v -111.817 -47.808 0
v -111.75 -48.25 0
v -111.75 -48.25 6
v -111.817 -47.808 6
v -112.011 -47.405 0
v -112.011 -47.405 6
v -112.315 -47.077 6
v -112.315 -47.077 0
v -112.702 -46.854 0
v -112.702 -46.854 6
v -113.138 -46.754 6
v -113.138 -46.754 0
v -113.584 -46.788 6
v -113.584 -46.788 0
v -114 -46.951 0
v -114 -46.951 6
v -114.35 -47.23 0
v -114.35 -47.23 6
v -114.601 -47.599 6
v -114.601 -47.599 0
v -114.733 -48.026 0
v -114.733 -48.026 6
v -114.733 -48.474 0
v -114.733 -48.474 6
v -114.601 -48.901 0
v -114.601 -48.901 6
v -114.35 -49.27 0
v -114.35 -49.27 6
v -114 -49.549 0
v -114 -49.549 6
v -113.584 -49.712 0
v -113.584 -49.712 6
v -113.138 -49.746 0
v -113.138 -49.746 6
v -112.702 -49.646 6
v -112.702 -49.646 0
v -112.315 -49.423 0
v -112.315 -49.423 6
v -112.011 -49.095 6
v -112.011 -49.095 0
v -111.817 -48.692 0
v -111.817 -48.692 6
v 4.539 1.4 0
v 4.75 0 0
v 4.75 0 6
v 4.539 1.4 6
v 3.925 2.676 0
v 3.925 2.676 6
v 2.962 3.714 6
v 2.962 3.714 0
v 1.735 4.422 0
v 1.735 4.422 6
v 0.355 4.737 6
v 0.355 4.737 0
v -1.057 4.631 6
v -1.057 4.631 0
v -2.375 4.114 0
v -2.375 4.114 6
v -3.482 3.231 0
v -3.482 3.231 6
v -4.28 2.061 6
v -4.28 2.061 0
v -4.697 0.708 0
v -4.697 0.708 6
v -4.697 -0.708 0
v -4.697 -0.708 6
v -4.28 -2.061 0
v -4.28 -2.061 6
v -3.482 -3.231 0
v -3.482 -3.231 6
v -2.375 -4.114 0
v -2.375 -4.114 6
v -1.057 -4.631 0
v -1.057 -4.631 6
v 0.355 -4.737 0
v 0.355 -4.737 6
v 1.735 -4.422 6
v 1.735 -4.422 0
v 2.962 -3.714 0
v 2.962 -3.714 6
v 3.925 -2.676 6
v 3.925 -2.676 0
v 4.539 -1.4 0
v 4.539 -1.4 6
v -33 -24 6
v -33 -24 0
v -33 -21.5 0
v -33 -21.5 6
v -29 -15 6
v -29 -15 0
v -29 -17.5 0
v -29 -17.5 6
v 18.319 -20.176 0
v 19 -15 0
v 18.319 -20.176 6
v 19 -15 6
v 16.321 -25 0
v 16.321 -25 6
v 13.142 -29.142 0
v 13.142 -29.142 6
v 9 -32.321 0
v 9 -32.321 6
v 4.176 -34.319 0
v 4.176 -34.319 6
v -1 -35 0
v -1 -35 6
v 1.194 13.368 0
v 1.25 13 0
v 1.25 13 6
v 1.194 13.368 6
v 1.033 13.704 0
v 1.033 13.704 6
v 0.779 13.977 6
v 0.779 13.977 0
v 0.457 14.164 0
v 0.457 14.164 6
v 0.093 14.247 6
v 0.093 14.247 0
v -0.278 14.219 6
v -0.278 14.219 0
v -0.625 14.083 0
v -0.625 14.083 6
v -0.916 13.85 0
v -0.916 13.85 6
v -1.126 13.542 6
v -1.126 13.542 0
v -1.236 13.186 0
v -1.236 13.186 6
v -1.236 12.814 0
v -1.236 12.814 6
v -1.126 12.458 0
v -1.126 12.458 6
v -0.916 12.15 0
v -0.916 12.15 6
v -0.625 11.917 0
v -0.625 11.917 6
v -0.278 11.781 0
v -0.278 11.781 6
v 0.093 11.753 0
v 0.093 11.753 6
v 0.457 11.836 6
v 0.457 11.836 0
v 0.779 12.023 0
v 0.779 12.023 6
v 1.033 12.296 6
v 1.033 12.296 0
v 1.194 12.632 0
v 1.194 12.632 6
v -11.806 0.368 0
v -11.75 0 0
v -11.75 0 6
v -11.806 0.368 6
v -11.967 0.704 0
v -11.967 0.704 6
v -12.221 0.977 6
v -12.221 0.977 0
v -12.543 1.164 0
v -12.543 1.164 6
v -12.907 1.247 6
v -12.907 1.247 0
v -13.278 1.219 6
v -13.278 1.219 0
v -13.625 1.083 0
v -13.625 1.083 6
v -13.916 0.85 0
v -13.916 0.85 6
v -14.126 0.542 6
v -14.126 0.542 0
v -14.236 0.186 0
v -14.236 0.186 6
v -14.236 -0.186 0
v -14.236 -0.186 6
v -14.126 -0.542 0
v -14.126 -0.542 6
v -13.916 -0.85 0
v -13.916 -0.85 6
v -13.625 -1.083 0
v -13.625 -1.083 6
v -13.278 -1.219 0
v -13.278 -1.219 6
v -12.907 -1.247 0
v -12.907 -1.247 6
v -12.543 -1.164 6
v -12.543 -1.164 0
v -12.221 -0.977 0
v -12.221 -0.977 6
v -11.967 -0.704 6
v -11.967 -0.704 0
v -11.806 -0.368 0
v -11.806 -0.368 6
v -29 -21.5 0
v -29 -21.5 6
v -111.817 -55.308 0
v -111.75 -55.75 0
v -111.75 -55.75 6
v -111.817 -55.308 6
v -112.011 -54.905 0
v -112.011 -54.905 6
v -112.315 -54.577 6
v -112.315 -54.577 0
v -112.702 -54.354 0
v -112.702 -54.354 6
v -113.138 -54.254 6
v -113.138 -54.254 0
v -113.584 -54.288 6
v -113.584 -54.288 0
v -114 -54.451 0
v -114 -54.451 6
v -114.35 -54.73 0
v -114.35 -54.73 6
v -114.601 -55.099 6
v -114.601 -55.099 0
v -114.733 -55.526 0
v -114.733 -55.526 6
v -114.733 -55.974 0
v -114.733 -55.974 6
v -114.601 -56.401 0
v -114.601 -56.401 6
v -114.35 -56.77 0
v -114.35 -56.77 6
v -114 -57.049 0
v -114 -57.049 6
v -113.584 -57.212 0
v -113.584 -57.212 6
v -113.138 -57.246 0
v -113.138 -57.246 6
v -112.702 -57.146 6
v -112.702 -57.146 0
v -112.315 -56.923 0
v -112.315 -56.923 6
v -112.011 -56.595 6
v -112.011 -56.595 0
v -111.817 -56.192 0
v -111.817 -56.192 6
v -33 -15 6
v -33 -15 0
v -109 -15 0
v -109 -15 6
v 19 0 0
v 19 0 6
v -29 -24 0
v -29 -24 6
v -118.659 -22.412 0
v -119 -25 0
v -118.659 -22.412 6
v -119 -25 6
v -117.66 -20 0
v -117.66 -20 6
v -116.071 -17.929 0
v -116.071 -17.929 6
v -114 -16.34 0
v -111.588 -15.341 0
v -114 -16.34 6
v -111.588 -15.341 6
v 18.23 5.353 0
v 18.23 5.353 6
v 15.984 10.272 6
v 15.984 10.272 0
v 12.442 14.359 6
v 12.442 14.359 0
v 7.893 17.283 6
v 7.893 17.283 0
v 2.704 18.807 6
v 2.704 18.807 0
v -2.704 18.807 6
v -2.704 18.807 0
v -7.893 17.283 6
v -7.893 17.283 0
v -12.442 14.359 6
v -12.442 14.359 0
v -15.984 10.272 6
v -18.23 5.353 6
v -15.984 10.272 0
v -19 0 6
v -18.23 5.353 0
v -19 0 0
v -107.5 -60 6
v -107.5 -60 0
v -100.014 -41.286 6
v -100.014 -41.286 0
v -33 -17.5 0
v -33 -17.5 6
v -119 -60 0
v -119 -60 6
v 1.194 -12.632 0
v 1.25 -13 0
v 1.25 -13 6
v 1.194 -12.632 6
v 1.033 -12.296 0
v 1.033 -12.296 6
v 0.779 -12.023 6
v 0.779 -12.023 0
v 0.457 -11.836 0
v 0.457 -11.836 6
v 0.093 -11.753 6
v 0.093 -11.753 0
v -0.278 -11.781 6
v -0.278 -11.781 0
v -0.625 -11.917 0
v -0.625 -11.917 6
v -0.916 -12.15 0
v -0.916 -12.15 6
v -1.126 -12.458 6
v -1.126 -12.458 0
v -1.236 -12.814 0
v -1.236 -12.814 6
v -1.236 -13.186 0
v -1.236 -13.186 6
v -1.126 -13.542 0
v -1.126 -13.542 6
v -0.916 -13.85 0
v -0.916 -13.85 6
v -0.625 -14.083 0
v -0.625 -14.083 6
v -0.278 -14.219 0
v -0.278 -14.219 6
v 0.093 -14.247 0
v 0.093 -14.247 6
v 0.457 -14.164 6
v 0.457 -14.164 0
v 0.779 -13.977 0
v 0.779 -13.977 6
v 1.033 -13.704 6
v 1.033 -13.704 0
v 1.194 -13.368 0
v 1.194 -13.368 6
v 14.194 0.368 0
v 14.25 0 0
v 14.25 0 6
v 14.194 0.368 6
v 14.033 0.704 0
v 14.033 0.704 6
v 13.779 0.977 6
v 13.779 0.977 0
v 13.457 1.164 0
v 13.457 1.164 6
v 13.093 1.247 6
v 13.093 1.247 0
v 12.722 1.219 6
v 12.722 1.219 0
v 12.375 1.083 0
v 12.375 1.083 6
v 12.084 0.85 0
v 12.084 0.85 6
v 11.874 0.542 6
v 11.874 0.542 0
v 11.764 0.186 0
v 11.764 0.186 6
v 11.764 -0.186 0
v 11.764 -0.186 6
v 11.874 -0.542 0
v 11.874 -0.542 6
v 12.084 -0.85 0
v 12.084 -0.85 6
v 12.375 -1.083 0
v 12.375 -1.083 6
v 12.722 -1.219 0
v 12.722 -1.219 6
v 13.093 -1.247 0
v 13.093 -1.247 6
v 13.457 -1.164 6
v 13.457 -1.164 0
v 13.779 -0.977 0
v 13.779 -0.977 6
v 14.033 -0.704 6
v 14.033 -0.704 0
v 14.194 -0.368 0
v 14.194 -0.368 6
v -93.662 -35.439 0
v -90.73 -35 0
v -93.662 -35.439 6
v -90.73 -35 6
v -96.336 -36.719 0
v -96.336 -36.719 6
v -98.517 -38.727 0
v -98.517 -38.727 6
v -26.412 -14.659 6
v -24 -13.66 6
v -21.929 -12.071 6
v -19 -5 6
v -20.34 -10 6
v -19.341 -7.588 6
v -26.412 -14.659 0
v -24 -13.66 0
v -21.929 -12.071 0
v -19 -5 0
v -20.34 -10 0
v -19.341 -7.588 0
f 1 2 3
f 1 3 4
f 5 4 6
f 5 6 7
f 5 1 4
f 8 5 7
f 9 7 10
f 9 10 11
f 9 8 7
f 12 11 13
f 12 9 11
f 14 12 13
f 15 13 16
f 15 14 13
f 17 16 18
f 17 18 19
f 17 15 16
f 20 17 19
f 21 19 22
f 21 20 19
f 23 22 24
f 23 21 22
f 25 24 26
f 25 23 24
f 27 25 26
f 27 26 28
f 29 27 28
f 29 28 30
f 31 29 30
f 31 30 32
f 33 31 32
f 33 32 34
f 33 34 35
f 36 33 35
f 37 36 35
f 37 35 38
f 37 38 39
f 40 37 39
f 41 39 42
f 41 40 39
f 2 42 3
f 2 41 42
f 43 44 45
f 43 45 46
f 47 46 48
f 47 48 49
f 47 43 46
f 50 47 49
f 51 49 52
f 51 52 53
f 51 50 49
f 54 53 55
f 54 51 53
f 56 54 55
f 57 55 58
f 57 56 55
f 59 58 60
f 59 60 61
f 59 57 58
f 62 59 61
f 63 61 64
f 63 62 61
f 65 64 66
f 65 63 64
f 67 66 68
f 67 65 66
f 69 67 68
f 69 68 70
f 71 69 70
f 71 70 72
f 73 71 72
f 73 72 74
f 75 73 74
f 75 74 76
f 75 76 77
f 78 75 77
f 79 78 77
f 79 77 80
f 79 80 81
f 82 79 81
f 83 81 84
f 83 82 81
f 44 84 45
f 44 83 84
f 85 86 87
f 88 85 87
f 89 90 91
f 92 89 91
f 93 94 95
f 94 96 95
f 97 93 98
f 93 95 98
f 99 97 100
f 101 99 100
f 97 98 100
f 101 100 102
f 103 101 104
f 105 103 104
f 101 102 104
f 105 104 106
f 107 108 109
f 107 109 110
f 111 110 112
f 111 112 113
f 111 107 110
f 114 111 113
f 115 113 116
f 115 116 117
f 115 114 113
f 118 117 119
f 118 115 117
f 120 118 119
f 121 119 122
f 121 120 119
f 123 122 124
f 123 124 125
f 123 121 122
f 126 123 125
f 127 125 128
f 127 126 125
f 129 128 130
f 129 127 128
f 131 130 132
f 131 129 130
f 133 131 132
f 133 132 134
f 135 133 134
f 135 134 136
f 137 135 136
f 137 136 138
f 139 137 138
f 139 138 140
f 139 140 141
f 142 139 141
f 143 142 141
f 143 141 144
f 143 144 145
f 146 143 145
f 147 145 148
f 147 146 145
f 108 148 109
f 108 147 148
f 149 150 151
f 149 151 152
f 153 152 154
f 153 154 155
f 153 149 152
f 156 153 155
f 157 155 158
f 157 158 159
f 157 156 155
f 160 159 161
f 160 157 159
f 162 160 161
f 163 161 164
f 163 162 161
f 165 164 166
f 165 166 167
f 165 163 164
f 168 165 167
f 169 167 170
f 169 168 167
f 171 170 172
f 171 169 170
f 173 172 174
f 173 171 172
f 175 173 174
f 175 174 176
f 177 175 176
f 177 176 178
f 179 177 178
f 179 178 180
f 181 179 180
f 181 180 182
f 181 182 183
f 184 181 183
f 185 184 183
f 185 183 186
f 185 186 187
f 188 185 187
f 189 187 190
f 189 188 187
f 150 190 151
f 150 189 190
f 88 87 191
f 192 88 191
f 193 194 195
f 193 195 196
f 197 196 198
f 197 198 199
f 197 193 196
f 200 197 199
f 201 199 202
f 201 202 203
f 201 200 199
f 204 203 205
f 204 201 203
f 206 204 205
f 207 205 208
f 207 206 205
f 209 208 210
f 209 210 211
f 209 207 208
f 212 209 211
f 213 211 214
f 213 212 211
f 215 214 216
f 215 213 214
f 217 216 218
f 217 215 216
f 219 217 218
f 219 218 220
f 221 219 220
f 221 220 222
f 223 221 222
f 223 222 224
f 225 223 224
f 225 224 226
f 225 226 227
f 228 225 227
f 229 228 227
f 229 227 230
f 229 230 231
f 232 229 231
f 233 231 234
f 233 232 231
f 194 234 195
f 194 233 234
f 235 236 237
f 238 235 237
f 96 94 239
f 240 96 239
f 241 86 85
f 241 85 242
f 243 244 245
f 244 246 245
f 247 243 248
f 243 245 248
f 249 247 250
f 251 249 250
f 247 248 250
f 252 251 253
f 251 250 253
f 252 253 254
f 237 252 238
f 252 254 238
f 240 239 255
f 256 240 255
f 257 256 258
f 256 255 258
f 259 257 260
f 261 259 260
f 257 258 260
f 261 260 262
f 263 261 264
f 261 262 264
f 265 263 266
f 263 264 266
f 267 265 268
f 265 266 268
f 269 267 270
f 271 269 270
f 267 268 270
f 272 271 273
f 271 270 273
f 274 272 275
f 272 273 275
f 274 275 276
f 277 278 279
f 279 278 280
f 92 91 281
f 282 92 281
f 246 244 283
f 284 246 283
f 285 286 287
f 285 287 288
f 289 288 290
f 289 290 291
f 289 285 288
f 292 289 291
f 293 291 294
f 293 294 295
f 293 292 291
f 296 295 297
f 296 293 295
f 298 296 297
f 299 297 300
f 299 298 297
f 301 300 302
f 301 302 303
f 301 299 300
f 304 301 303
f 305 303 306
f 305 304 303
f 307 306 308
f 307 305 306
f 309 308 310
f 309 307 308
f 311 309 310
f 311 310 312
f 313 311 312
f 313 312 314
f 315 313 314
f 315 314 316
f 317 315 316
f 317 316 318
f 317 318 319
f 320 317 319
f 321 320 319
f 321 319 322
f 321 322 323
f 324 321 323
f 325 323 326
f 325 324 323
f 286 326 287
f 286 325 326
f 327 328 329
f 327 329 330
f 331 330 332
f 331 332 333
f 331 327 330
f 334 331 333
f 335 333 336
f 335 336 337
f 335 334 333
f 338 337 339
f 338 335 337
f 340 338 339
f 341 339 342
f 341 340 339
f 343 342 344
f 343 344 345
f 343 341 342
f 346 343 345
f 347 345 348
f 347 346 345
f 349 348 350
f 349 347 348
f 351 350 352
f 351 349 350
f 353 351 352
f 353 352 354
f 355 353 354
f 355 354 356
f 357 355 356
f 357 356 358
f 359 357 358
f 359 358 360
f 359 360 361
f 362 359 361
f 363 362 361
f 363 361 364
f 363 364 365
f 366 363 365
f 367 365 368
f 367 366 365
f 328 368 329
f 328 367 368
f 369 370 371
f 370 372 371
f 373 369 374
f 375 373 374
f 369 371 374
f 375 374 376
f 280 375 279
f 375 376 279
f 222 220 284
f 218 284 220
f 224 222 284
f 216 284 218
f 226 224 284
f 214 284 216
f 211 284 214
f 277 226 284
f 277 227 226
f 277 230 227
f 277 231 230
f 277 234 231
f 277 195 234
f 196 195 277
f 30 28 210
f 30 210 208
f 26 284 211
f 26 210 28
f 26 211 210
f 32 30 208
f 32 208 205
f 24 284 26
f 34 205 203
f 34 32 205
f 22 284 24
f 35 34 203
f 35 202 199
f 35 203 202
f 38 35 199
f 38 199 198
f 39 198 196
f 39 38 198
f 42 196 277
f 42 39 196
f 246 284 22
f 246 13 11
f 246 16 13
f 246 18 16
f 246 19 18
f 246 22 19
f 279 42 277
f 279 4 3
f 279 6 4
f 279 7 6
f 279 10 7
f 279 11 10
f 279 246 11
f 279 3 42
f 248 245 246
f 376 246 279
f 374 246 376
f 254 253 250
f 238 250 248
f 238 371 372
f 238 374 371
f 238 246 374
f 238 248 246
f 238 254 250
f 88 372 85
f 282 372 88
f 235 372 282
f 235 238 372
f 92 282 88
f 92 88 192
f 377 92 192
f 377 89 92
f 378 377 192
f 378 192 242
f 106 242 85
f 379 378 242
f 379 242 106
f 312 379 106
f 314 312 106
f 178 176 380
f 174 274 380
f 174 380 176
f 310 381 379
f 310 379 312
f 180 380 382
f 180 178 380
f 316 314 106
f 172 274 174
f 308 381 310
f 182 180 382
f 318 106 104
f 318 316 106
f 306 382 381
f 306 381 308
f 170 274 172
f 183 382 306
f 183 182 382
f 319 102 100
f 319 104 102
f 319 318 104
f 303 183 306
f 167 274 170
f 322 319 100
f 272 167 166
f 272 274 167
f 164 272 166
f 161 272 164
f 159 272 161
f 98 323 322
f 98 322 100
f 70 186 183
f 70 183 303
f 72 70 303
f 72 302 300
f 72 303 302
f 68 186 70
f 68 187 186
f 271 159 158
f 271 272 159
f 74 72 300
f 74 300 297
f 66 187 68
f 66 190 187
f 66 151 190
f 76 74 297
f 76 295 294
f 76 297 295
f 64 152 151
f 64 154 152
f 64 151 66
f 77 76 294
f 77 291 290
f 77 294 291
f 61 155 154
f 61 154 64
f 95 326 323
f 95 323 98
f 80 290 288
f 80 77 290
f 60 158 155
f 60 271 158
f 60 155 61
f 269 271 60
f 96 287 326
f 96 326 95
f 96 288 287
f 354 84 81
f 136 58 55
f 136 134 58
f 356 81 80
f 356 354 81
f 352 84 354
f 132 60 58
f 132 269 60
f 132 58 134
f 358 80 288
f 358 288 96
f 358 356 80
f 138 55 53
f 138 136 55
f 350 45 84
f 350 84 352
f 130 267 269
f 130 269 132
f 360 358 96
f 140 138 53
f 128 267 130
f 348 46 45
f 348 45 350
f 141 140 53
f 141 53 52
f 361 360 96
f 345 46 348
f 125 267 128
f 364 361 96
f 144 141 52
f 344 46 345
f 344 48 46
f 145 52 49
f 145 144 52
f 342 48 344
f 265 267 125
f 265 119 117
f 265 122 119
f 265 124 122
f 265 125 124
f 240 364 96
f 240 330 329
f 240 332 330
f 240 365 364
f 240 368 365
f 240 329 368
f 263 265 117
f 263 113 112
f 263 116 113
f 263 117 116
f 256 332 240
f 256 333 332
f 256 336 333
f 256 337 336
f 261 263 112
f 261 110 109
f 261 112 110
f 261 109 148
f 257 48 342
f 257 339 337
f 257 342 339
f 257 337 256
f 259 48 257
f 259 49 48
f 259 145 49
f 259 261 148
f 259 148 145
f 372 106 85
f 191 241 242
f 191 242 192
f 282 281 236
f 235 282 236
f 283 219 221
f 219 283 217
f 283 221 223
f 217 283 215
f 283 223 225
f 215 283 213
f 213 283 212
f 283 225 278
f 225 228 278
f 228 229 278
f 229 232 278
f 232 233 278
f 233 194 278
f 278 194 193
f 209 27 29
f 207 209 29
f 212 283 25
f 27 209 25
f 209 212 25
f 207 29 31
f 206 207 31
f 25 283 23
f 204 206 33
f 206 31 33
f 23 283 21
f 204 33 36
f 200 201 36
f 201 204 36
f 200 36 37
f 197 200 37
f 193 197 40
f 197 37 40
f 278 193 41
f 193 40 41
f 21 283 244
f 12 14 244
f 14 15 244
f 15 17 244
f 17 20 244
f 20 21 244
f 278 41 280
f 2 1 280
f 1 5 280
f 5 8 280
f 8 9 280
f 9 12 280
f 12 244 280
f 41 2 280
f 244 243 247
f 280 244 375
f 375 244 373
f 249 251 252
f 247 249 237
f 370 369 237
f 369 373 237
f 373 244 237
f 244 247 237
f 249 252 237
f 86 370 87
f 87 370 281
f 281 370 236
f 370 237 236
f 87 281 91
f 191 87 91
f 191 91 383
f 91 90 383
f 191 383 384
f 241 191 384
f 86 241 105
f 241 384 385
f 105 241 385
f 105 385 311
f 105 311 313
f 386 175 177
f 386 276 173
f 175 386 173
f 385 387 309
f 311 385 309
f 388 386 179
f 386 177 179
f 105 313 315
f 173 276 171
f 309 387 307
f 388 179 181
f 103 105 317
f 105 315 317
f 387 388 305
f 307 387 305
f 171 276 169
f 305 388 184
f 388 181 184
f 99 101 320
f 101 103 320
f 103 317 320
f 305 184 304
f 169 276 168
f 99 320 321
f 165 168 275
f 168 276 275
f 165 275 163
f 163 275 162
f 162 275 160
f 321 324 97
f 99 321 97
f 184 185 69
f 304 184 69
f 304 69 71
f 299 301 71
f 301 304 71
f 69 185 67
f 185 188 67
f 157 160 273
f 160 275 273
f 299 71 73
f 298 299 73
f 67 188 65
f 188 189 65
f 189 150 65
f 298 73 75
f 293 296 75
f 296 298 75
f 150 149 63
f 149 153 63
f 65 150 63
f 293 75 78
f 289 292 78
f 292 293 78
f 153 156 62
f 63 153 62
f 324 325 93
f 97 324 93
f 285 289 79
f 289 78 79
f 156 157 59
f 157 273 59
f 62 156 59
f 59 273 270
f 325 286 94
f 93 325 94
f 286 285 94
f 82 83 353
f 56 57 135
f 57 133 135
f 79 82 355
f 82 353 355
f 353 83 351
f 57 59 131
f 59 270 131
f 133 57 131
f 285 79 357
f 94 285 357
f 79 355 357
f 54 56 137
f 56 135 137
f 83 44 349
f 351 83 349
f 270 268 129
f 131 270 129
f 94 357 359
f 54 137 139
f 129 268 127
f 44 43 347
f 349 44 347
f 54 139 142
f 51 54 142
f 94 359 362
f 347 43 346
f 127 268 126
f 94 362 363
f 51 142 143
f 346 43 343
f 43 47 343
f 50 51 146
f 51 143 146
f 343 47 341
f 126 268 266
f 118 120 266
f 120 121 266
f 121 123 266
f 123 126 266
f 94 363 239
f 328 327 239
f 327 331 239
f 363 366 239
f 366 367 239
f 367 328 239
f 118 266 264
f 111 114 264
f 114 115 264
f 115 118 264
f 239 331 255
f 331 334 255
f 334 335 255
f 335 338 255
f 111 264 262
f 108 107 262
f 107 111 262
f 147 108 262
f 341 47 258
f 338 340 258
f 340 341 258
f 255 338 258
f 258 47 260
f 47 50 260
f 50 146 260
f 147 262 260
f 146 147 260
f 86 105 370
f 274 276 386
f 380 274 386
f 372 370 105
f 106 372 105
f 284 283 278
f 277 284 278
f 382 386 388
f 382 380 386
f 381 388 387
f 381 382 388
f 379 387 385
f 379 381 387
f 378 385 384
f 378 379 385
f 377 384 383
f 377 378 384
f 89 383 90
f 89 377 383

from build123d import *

# Parameters (mm, degrees)
SKETCH_1_W      = 4
SKETCH_1_H      = 2.5
SKETCH_1_R      = 1.25
SKETCH_1_R_2    = 4.75
SKETCH_1_R_3    = 1.5
EXTRUDE_1_DEPTH = 6
FILLET_1_R      = 10
FILLET_2_R      = 20
FILLET_3_R      = 10


with BuildPart() as part:
    # Эскиз1 → Бобышка-Вытянуть1 (new body)
    with BuildSketch(Plane.XY):
        with BuildLine():
            Line((19, -35), (19, 0))
            ThreePointArc((19, 0), (0, 19), (-19, 0))
            Line((-19, 0), (-19, -15))
            Line((-19, -15), (-29, -15))
            Line((-29, -15), (-29, -17.5))
            Line((-29, -17.5), (-33, -17.5))
            Line((-33, -17.5), (-33, -15))
            Line((-33, -15), (-119, -15))
            Line((-119, -15), (-119, -60))
            Line((-119, -60), (-107.5, -60))
            Line((-107.5, -60), (-97.5, -35))
            Line((-97.5, -35), (19, -35))
        make_face()
        with Locations((-31, -22.75)):
            Rectangle(SKETCH_1_W, SKETCH_1_H, mode=Mode.SUBTRACT)
        with Locations((0, -13)):
            Circle(SKETCH_1_R, mode=Mode.SUBTRACT)
        with Locations((-13, 0)):
            Circle(SKETCH_1_R, mode=Mode.SUBTRACT)
        Circle(SKETCH_1_R_2, mode=Mode.SUBTRACT)
        with Locations((13, 0)):
            Circle(SKETCH_1_R, mode=Mode.SUBTRACT)
        with Locations((0, 13)):
            Circle(SKETCH_1_R, mode=Mode.SUBTRACT)
        with Locations((-113.25, -55.75)):
            Circle(SKETCH_1_R_3, mode=Mode.SUBTRACT)
        with Locations((-113.25, -48.25)):
            Circle(SKETCH_1_R_3, mode=Mode.SUBTRACT)
    extrude(amount=EXTRUDE_1_DEPTH)

    # Скругление1
    fillet_1_edges = [part.edges().sort_by_distance(p)[0] for p in [
        (-19, -15, 3),
    ]]
    fillet(fillet_1_edges, radius=FILLET_1_R - 0.0001)  # a hair under: the kernel refuses the full size

    # Скругление2
    fillet_2_edges = [part.edges().sort_by_distance(p)[0] for p in [
        (19, -35, 3),
    ]]
    fillet(fillet_2_edges, radius=FILLET_2_R)

    # Скругление3
    fillet_3_edges = [part.edges().sort_by_distance(p)[0] for p in [
        (-119, -15, 3),
        (-97.5, -35, 3),
    ]]
    fillet(fillet_3_edges, radius=FILLET_3_R)


solid = part.part
